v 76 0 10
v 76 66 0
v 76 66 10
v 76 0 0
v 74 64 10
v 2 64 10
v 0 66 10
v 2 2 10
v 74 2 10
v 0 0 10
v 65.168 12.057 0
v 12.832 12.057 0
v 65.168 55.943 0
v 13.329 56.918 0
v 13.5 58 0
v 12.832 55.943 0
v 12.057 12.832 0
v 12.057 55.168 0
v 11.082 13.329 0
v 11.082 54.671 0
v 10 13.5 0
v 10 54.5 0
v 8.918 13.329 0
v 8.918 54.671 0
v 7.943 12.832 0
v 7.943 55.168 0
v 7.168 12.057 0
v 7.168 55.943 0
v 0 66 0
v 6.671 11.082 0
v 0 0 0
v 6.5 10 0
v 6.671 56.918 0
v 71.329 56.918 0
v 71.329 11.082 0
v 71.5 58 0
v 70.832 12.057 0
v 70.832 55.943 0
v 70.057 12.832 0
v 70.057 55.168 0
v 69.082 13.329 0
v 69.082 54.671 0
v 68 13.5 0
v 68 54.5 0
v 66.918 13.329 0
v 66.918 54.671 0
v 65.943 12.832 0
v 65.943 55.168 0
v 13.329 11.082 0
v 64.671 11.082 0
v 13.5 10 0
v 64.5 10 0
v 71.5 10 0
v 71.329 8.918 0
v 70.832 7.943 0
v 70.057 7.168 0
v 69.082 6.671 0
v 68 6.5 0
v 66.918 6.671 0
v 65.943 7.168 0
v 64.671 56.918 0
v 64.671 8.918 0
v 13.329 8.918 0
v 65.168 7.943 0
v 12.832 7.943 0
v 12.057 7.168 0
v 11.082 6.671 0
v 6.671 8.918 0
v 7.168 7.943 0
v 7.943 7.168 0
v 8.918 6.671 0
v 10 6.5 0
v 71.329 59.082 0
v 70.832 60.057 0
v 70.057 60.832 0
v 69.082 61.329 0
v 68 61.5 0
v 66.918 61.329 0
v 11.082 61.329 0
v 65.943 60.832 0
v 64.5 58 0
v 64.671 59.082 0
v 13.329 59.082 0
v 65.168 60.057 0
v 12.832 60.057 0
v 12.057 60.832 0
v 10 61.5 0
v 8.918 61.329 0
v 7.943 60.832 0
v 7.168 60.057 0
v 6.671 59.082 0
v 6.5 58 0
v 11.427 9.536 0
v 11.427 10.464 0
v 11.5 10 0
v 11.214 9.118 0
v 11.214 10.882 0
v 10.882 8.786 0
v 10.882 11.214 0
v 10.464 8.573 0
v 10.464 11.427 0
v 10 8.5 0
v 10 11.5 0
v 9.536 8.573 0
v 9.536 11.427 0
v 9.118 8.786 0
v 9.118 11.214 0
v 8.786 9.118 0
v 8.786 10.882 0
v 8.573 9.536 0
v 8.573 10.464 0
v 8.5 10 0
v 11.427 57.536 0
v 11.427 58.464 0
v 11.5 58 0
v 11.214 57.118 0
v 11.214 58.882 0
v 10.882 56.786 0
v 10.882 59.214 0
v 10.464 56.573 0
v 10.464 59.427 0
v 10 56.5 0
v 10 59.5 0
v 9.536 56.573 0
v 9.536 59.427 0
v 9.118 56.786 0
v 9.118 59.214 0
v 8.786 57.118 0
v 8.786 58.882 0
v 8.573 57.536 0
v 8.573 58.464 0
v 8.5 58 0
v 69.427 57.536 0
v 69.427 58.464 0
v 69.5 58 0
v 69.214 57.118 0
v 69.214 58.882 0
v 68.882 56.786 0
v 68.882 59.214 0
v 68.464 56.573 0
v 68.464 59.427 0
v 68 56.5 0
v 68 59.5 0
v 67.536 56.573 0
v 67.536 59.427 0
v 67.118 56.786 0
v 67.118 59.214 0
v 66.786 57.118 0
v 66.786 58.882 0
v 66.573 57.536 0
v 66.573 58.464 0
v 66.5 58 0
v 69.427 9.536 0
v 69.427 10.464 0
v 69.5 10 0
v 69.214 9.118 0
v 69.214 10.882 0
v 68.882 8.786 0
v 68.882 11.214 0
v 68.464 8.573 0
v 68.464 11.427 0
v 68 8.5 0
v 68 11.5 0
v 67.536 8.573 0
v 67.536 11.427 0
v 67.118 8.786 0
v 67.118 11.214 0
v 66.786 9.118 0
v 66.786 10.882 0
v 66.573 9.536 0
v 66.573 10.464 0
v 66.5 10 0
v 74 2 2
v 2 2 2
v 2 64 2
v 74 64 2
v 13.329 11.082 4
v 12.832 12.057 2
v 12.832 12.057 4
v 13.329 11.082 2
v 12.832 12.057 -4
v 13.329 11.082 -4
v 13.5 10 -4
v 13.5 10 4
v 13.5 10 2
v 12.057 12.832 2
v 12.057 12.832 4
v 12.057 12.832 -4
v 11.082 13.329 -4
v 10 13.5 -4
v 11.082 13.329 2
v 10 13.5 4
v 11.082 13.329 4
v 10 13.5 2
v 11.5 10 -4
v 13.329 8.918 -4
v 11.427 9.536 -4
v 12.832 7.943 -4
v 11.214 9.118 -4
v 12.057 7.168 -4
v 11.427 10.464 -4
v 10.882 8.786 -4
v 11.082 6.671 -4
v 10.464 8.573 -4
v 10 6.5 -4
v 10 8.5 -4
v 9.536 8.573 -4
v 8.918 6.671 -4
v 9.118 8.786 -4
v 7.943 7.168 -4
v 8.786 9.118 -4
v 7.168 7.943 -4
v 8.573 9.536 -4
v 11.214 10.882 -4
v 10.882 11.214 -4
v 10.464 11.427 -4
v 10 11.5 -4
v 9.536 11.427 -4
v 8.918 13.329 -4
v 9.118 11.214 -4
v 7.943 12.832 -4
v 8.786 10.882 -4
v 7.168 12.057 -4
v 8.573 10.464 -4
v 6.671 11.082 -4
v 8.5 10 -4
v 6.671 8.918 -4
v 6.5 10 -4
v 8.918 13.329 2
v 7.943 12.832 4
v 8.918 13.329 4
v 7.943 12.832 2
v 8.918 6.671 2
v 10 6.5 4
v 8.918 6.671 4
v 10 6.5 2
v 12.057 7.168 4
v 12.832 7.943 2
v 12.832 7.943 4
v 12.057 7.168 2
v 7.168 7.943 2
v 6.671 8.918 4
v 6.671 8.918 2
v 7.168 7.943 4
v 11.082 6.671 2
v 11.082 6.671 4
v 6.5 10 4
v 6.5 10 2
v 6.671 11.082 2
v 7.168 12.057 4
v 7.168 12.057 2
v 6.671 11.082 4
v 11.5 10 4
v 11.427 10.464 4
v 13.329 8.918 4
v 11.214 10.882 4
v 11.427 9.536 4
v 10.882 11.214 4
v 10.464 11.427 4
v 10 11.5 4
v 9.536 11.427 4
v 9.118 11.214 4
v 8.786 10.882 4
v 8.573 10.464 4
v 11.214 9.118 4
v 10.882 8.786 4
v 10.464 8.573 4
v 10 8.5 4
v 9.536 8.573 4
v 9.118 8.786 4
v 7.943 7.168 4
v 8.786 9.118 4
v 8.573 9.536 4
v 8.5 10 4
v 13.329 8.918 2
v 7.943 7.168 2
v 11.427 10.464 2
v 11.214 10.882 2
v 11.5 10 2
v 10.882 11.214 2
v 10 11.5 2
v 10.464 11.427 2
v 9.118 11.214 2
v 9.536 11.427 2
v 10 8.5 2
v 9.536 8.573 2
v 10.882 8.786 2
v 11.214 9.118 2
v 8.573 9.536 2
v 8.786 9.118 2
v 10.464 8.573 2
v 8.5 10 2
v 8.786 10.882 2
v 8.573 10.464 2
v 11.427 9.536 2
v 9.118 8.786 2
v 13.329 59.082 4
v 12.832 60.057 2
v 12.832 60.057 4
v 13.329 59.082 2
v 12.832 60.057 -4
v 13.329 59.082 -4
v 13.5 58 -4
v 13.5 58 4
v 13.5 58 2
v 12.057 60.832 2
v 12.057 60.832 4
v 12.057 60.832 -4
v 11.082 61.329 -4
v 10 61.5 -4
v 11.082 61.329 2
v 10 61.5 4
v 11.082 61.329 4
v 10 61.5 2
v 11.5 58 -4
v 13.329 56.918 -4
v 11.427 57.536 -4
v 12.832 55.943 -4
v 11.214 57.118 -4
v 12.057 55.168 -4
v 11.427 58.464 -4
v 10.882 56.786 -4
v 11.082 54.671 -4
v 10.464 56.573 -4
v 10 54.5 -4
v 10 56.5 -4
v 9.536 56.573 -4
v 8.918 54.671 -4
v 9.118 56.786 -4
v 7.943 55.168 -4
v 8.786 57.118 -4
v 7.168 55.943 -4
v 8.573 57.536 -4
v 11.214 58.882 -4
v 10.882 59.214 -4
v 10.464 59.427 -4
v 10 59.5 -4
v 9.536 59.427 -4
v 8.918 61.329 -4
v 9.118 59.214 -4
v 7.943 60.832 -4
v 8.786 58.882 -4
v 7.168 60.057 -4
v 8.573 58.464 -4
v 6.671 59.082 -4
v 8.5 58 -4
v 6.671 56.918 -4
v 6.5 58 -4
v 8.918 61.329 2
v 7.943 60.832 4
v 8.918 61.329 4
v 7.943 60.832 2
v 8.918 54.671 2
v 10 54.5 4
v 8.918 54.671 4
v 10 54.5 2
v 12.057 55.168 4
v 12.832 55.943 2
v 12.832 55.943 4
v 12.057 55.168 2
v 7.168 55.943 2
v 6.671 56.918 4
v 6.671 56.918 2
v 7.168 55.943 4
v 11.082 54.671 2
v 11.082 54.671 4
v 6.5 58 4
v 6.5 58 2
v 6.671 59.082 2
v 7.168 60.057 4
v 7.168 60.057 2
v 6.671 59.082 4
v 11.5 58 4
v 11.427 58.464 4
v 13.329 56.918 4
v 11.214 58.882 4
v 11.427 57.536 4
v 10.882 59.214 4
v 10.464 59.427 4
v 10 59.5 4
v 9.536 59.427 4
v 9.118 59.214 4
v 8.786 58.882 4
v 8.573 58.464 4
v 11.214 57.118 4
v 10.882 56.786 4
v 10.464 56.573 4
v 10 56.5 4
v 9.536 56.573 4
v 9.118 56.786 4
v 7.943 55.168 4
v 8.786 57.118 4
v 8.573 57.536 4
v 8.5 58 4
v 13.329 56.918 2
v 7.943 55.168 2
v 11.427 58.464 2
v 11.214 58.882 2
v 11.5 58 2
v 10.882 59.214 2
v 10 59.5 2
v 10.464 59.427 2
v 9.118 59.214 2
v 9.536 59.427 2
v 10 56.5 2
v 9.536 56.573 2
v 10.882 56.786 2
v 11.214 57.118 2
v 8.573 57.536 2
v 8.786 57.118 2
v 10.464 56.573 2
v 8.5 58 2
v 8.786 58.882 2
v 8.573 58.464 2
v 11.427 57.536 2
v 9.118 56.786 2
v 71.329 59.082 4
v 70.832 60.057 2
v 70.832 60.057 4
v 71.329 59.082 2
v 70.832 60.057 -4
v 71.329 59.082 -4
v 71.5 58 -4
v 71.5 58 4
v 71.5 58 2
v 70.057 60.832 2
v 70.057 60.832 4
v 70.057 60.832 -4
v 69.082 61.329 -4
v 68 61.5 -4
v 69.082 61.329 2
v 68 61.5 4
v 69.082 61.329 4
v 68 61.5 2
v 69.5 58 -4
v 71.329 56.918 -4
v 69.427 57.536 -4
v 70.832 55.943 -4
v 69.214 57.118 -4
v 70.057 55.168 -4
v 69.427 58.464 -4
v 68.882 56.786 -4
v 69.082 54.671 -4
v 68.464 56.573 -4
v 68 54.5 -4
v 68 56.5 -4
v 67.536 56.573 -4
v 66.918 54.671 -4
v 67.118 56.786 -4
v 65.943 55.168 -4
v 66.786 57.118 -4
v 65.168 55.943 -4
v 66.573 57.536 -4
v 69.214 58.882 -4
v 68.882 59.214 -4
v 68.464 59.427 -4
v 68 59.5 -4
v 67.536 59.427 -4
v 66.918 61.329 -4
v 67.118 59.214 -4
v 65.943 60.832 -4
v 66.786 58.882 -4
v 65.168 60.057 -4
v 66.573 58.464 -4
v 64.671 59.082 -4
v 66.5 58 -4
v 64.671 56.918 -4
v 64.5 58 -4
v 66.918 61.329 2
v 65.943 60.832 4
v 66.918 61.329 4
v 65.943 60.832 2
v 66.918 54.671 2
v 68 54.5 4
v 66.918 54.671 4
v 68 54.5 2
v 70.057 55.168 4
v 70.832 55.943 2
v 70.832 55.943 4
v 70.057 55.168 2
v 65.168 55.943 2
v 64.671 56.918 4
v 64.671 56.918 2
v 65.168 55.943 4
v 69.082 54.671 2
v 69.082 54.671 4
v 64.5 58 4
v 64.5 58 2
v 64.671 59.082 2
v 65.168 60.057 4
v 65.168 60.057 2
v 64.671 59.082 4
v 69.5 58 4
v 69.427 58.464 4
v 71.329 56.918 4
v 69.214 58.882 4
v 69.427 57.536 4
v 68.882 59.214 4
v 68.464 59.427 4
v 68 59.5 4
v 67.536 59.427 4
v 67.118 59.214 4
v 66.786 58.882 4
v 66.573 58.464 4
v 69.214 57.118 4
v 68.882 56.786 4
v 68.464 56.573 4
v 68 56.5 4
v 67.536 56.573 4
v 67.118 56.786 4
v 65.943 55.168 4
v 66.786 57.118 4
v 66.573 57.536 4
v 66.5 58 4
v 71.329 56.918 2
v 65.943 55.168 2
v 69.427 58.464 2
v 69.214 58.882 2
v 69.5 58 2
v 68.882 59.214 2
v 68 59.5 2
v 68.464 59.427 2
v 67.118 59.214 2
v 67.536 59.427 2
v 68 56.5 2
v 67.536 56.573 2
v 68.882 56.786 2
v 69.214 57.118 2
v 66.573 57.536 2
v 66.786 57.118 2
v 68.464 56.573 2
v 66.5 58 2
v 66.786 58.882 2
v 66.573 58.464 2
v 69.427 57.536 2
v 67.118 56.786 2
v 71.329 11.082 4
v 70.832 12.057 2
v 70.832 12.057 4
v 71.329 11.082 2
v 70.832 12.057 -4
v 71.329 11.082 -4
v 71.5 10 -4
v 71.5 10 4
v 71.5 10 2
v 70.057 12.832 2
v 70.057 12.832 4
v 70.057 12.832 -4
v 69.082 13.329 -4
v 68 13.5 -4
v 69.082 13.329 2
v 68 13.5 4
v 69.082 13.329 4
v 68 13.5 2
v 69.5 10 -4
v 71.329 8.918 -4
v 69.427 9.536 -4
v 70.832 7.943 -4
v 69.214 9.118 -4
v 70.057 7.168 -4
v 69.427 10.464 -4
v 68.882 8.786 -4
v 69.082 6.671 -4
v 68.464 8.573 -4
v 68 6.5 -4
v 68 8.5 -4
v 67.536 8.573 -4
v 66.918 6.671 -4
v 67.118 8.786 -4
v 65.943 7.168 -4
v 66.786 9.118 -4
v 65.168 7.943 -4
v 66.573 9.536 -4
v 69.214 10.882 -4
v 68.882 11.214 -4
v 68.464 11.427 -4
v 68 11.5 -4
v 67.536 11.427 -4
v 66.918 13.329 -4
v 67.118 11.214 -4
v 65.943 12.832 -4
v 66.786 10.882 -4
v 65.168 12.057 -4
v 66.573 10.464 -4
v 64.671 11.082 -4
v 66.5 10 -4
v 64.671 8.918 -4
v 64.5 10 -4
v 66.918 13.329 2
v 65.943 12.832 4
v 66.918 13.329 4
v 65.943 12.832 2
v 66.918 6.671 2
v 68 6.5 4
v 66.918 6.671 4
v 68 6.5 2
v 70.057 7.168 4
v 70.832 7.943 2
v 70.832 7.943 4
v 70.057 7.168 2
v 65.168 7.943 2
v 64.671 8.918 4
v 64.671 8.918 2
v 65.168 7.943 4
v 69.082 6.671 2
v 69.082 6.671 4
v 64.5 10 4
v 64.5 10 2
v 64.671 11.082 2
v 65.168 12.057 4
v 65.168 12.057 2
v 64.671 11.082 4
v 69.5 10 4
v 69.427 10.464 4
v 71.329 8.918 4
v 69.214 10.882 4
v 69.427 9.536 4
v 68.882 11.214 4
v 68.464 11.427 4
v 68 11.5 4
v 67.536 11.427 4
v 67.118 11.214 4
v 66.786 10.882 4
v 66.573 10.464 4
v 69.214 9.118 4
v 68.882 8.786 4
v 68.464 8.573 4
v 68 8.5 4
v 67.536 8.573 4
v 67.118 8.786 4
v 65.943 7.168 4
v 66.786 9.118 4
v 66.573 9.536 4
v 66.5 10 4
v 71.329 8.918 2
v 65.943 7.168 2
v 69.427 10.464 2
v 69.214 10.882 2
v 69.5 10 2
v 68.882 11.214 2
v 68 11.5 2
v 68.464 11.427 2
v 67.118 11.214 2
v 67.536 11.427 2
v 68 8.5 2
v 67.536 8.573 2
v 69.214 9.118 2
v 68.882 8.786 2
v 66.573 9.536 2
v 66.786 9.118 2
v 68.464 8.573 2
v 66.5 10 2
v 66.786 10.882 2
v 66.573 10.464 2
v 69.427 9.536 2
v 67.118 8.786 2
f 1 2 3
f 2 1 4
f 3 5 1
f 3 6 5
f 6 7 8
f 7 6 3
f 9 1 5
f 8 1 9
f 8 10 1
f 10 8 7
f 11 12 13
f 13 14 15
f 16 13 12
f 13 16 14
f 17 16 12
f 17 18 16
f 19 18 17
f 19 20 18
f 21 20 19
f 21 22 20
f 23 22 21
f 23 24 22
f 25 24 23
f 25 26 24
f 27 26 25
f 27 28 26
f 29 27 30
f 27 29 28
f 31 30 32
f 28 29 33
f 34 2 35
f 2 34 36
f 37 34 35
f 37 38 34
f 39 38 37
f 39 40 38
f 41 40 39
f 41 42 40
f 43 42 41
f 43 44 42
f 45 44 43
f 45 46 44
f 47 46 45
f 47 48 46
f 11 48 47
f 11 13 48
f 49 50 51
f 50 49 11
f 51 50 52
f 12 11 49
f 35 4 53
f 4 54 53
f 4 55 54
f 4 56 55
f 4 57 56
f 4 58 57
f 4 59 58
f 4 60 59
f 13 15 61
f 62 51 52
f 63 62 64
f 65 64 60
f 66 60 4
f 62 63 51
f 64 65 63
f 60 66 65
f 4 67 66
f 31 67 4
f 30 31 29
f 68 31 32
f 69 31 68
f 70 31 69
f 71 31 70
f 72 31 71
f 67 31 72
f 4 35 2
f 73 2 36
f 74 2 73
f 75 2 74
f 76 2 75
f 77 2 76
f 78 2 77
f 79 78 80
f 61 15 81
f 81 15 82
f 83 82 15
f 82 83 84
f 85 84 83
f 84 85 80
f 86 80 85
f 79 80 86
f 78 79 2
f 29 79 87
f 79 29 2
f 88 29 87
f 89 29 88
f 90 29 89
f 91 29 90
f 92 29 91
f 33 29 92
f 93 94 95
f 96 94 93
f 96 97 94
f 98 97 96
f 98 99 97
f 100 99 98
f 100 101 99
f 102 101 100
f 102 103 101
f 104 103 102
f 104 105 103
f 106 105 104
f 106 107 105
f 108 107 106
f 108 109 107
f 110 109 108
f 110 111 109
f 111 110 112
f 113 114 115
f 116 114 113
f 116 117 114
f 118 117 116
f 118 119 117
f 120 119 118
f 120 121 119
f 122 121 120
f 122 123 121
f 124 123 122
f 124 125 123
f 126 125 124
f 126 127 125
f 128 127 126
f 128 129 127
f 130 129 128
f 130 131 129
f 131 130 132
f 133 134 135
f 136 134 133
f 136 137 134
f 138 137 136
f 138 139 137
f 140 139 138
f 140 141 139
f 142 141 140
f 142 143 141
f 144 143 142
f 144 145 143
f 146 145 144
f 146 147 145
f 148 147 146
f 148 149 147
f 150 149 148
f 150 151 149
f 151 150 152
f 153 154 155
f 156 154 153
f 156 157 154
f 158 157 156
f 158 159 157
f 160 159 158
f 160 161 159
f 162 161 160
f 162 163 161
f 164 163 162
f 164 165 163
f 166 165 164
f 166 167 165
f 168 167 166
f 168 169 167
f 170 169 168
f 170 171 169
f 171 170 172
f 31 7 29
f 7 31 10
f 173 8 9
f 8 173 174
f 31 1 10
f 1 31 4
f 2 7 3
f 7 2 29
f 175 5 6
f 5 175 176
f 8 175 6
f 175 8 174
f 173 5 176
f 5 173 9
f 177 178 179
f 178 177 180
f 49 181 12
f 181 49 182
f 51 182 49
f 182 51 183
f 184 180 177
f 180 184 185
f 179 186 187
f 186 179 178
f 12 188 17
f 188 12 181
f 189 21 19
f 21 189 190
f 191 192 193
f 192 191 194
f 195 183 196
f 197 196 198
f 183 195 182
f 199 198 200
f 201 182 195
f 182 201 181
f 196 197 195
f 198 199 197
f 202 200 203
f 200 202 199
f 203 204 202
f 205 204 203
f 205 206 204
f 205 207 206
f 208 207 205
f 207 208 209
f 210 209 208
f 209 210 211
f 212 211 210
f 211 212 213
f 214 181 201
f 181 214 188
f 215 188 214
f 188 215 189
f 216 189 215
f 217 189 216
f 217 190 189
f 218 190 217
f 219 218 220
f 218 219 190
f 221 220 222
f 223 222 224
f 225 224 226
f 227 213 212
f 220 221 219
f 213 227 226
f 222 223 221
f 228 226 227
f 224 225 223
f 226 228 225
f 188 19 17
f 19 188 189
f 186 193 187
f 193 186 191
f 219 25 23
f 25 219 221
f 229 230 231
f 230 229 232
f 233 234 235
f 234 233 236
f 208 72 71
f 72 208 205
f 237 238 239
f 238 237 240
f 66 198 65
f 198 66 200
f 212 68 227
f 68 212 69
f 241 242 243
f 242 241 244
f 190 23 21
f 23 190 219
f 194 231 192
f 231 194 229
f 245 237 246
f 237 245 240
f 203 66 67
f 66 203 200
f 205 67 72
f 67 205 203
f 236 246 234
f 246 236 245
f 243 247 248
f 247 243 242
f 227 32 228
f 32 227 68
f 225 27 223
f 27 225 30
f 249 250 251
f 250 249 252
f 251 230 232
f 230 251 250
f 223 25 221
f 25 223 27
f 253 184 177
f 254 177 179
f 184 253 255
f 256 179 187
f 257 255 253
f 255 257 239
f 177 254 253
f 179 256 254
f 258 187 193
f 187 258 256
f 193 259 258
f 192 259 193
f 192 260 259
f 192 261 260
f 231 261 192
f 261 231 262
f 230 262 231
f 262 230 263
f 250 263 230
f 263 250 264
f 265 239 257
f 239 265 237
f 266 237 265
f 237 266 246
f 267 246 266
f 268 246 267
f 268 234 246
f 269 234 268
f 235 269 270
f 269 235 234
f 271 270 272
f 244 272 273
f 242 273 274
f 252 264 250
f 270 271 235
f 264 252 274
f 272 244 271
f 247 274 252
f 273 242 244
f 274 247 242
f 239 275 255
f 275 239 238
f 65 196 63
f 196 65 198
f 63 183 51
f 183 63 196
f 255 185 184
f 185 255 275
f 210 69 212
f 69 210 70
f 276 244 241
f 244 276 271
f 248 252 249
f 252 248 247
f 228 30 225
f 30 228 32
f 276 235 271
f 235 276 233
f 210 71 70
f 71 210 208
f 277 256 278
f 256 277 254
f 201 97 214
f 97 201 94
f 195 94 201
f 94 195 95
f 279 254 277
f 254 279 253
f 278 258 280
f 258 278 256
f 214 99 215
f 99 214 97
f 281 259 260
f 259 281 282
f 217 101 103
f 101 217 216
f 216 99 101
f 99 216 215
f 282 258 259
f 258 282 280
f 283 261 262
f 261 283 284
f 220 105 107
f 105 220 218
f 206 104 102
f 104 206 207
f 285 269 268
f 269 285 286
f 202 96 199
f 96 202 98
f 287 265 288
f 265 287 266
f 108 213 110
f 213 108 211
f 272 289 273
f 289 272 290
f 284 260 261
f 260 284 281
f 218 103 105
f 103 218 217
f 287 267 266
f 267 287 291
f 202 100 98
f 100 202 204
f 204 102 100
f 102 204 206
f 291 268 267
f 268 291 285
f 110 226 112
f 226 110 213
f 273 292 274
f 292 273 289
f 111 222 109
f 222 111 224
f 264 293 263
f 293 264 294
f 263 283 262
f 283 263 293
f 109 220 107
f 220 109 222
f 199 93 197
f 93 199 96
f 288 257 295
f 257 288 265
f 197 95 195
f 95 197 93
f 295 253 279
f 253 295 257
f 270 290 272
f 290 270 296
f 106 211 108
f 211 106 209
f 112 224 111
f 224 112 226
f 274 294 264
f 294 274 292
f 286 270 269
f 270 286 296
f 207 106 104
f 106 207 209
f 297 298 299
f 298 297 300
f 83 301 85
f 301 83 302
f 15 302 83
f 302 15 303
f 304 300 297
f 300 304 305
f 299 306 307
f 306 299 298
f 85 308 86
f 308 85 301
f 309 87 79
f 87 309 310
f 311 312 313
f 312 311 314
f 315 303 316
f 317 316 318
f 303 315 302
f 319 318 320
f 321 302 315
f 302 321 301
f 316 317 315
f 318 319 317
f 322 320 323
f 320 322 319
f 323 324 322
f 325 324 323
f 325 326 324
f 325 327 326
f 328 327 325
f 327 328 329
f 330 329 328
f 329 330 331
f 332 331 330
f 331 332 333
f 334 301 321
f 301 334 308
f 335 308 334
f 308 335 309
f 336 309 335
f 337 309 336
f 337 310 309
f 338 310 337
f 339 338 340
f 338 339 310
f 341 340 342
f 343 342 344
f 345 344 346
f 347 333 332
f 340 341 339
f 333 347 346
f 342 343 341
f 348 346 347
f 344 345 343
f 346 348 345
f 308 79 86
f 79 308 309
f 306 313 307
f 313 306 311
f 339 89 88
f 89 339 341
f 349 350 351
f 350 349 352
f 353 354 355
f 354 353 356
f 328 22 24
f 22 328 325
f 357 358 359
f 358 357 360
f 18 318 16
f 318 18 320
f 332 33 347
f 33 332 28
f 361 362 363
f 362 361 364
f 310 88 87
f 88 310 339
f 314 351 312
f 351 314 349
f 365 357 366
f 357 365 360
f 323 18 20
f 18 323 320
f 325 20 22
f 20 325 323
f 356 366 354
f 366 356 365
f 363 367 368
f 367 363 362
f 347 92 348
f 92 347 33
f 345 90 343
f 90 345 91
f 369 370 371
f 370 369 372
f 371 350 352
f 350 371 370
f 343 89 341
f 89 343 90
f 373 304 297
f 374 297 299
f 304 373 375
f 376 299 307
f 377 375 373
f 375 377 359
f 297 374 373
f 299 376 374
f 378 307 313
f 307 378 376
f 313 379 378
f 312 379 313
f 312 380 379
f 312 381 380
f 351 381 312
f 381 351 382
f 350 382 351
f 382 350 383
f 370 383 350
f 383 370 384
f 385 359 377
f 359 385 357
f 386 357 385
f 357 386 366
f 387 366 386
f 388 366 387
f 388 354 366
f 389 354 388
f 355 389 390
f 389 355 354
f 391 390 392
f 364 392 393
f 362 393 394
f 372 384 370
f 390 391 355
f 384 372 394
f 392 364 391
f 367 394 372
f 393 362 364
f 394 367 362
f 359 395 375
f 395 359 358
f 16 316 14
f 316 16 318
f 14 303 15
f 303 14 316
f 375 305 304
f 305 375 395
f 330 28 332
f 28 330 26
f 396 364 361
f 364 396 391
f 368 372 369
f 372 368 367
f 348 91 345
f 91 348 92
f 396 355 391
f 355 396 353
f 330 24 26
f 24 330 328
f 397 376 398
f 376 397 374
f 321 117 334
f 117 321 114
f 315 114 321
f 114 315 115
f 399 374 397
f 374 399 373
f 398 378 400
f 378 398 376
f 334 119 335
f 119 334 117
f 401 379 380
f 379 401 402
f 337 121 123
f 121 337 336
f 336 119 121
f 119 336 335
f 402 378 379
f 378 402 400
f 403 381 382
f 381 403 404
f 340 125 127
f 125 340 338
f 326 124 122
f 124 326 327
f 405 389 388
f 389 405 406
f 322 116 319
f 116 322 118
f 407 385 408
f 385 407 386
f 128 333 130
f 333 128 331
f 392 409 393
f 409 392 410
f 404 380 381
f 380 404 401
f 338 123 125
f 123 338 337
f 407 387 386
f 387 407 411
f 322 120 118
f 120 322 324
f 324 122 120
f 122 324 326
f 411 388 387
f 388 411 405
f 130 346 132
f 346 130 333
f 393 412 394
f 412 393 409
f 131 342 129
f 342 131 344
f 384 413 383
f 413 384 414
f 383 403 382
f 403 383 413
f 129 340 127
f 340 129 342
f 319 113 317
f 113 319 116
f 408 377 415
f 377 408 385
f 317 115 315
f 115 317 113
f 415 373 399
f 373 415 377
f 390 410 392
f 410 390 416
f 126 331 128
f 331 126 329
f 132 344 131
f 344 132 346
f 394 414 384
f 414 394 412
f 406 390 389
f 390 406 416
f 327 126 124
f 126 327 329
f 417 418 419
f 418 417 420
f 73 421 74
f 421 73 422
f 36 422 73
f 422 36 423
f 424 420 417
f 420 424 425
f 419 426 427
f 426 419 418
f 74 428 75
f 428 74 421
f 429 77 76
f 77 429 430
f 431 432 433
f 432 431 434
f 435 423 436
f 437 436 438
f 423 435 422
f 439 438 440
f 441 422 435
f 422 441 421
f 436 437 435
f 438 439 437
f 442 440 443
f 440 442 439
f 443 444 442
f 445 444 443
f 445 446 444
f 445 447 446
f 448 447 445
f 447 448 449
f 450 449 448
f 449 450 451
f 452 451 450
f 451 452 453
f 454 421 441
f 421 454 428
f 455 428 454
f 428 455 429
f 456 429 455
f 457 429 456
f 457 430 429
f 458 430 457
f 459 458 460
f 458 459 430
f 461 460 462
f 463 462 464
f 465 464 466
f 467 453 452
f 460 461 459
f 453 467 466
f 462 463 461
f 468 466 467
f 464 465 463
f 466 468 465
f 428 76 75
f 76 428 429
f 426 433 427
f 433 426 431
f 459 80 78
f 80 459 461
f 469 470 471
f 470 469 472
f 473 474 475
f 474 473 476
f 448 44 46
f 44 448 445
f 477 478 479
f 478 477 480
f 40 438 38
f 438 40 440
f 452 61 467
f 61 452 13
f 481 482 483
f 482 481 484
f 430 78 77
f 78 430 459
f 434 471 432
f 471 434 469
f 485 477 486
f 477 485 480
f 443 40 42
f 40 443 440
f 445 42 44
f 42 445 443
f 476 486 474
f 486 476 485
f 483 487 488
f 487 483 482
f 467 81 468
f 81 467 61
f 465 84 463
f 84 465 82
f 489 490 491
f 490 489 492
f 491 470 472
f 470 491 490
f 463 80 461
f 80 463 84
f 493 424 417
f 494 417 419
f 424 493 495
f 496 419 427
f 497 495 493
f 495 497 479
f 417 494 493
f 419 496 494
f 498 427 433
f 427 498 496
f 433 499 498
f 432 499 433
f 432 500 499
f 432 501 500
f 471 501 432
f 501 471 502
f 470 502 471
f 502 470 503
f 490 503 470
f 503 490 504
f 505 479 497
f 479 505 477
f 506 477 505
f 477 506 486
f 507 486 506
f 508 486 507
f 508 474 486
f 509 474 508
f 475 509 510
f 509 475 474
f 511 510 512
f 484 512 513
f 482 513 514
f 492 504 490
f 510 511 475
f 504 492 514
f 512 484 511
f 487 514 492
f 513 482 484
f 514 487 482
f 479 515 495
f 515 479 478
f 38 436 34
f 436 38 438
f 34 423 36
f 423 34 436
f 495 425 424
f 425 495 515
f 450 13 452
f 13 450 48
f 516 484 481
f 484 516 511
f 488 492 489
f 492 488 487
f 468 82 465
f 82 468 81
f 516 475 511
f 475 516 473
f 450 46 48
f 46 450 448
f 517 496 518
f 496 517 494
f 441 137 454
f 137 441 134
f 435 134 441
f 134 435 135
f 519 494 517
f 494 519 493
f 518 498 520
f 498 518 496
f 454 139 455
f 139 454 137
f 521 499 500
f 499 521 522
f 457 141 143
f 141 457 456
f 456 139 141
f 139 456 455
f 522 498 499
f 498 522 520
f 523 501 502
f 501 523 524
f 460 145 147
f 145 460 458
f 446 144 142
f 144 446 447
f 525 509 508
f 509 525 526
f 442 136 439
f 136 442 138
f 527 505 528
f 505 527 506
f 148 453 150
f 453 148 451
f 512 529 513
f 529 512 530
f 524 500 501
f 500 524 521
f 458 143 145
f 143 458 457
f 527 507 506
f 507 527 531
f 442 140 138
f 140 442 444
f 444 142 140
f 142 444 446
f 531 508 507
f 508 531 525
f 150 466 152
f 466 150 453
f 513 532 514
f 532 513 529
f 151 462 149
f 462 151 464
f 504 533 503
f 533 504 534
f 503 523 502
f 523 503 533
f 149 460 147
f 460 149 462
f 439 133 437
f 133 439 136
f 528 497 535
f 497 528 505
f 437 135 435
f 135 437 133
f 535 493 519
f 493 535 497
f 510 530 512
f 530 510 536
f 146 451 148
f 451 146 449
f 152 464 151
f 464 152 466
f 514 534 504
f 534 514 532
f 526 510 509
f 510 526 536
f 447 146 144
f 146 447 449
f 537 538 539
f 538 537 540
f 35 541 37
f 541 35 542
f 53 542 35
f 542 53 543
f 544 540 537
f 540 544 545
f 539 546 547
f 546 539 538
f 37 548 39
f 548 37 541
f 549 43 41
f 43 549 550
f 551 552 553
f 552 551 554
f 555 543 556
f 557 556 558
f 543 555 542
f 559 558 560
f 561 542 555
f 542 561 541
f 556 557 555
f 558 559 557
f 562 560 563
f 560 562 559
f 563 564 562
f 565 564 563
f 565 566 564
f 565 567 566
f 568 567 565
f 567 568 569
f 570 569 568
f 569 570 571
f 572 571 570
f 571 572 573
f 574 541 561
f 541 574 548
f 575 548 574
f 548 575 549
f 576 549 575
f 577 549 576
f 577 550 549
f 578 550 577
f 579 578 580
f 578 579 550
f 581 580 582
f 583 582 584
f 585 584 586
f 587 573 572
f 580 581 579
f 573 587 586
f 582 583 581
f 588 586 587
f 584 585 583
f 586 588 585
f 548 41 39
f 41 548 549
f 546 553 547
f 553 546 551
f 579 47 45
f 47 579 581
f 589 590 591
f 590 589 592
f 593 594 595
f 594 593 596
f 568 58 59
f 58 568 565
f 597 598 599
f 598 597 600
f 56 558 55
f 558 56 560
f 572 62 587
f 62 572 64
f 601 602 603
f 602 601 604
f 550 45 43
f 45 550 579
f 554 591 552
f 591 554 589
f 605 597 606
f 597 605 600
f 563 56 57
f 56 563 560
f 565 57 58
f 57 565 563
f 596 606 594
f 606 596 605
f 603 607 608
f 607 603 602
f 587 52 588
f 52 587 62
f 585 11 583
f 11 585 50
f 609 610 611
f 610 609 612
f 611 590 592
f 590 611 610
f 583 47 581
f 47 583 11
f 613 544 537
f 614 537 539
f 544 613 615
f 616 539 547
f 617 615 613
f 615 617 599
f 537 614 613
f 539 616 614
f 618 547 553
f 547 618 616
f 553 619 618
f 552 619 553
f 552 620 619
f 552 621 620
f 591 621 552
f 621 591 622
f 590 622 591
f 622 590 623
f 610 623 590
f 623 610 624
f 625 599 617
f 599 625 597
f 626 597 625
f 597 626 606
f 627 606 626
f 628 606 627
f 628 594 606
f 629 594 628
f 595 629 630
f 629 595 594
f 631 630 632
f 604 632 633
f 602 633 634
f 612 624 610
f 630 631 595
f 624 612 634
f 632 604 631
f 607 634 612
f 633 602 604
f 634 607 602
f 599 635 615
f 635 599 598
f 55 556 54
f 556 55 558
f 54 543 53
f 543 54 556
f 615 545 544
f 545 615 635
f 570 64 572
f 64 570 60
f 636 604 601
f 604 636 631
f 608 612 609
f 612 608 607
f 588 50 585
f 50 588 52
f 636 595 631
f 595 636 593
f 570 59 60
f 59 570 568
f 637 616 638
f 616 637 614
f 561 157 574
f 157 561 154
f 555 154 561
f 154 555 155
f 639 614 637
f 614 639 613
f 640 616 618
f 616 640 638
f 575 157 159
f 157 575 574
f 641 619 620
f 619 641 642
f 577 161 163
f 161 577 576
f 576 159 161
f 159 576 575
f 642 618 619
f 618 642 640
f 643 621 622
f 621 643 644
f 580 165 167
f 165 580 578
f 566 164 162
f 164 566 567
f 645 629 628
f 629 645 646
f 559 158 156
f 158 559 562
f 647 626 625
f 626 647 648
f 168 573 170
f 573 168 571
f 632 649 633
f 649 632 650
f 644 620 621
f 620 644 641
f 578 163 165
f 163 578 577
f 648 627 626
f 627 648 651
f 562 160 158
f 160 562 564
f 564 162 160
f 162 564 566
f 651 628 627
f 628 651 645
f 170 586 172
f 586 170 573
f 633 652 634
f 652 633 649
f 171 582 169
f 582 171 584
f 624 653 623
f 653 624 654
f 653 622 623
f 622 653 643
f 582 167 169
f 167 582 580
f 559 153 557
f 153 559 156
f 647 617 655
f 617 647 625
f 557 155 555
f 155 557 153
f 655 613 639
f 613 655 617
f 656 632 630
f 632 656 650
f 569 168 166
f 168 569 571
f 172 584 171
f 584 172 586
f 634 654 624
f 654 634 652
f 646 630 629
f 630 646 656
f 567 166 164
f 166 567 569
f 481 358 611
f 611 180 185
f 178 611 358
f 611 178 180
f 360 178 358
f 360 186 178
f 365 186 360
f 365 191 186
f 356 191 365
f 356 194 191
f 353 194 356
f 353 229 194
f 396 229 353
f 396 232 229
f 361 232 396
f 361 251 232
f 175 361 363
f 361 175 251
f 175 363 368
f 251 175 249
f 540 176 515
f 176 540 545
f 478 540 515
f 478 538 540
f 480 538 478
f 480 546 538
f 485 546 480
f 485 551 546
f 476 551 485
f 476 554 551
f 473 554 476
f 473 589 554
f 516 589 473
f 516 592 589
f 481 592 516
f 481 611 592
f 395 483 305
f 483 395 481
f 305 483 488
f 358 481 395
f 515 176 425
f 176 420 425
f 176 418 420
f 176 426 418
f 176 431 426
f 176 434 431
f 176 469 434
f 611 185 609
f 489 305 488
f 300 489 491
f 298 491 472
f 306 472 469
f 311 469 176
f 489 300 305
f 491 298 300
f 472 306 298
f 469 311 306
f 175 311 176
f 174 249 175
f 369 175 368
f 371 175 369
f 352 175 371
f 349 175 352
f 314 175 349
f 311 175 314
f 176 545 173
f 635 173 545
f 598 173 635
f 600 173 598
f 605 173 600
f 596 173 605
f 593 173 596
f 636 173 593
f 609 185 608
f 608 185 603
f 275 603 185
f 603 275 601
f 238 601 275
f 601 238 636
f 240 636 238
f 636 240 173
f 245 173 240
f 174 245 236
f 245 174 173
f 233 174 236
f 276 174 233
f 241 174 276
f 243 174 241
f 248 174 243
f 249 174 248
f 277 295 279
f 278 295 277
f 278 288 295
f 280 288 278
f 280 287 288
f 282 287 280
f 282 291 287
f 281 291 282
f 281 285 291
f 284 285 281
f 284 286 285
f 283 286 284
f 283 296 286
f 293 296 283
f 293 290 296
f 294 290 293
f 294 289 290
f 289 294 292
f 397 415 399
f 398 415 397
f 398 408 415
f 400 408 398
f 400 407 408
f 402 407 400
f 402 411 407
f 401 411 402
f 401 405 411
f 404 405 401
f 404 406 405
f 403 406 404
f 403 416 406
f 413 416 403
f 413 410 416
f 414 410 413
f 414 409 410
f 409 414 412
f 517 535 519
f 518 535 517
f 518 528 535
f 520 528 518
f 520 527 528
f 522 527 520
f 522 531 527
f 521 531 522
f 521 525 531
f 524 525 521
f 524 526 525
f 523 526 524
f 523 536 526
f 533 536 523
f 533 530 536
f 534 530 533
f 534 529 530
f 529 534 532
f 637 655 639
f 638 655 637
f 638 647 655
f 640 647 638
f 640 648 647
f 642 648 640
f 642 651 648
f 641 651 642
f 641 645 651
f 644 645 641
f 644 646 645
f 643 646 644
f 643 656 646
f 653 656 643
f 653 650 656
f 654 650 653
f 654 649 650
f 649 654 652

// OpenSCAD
$fn = 20;


module pcb_box(
	wall = 2,
	pcb_sz_x = 30,
	pcb_sz_y = 50,
	pcb_sz_z = 2,
	pcb_wall_gap = 1,
	side_sz_z = 10,
	screw_d = 3,
	screw_holes = [],
	leg_sz_z = 0,
	leg_pos = [],
	leg_d = 5
) {
	translate([wall, wall, 0]) {
		cube([pcb_sz_x+2*pcb_wall_gap, pcb_wall_gap*2+pcb_sz_y, wall]);
	}
	for(y=[0, pcb_sz_y+2*pcb_wall_gap+wall]) {
		translate([0, y, 0]) {
			cube([pcb_sz_x+2*pcb_wall_gap+2*wall, wall, side_sz_z]);
		}
	}

	for(x=[0, pcb_sz_x+2*pcb_wall_gap+wall]) {
		translate([x, 0, 0]) {
			cube([wall, pcb_sz_y+2*pcb_wall_gap+2*wall, side_sz_z]);
		}
	}

	if(leg_sz_z>0) {
		for(p=leg_pos) {
			translate([wall+2*pcb_wall_gap+(p[0]>=0 ? p[0] : pcb_sz_x+p[0]), wall+2*pcb_wall_gap+(p[1]>=0 ? p[1] : pcb_sz_y+p[1]), -leg_sz_z-wall]) {
				cylinder(d=leg_d, h=leg_sz_z, center=true);
			}
		}
	}

	for(p=screw_holes) {
		translate([wall+2*pcb_wall_gap+(p[0]>=0 ? p[0] : pcb_sz_x+p[0]), wall+2*pcb_wall_gap+(p[1]>=0 ? p[1] : pcb_sz_y+p[1]), 0]) {
			difference() {
				cylinder(d=screw_d+2*wall, h=side_sz_z-pcb_sz_z, center=true);
				cylinder(d=screw_d, h=side_sz_z-pcb_sz_z, center=true);
			}
		}
	}

	if(pcb_wall_gap > 0) {
		for(x=[0,1]) {
			for(y=[0,1]) {
				translate([wall+x*(pcb_sz_x+2*pcb_wall_gap), wall+y*(pcb_sz_y+2*pcb_wall_gap), 0]) {
					difference() {
						cylinder(d=pcb_wall_gap, h=side_sz_z, center=true);
						cylinder(d=screw_d, h=side_sz_z, center=true);
					}
				}
			}
		}
	}

}

module pcb_box_7x6(leg_sz_z=0, leg_pos=[]) {
	pcb_box(
		pcb_sz_x = 70,
		pcb_sz_y = 60,
		pcb_sz_z = 2,
		screw_holes=[
			[6, 6],
			[6, -6],
			[-6, -6],
			[-6, 6],
		],
		leg_sz_z=leg_sz_z,
		leg_pos=leg_pos
	);
}

pcb_box_7x6();
